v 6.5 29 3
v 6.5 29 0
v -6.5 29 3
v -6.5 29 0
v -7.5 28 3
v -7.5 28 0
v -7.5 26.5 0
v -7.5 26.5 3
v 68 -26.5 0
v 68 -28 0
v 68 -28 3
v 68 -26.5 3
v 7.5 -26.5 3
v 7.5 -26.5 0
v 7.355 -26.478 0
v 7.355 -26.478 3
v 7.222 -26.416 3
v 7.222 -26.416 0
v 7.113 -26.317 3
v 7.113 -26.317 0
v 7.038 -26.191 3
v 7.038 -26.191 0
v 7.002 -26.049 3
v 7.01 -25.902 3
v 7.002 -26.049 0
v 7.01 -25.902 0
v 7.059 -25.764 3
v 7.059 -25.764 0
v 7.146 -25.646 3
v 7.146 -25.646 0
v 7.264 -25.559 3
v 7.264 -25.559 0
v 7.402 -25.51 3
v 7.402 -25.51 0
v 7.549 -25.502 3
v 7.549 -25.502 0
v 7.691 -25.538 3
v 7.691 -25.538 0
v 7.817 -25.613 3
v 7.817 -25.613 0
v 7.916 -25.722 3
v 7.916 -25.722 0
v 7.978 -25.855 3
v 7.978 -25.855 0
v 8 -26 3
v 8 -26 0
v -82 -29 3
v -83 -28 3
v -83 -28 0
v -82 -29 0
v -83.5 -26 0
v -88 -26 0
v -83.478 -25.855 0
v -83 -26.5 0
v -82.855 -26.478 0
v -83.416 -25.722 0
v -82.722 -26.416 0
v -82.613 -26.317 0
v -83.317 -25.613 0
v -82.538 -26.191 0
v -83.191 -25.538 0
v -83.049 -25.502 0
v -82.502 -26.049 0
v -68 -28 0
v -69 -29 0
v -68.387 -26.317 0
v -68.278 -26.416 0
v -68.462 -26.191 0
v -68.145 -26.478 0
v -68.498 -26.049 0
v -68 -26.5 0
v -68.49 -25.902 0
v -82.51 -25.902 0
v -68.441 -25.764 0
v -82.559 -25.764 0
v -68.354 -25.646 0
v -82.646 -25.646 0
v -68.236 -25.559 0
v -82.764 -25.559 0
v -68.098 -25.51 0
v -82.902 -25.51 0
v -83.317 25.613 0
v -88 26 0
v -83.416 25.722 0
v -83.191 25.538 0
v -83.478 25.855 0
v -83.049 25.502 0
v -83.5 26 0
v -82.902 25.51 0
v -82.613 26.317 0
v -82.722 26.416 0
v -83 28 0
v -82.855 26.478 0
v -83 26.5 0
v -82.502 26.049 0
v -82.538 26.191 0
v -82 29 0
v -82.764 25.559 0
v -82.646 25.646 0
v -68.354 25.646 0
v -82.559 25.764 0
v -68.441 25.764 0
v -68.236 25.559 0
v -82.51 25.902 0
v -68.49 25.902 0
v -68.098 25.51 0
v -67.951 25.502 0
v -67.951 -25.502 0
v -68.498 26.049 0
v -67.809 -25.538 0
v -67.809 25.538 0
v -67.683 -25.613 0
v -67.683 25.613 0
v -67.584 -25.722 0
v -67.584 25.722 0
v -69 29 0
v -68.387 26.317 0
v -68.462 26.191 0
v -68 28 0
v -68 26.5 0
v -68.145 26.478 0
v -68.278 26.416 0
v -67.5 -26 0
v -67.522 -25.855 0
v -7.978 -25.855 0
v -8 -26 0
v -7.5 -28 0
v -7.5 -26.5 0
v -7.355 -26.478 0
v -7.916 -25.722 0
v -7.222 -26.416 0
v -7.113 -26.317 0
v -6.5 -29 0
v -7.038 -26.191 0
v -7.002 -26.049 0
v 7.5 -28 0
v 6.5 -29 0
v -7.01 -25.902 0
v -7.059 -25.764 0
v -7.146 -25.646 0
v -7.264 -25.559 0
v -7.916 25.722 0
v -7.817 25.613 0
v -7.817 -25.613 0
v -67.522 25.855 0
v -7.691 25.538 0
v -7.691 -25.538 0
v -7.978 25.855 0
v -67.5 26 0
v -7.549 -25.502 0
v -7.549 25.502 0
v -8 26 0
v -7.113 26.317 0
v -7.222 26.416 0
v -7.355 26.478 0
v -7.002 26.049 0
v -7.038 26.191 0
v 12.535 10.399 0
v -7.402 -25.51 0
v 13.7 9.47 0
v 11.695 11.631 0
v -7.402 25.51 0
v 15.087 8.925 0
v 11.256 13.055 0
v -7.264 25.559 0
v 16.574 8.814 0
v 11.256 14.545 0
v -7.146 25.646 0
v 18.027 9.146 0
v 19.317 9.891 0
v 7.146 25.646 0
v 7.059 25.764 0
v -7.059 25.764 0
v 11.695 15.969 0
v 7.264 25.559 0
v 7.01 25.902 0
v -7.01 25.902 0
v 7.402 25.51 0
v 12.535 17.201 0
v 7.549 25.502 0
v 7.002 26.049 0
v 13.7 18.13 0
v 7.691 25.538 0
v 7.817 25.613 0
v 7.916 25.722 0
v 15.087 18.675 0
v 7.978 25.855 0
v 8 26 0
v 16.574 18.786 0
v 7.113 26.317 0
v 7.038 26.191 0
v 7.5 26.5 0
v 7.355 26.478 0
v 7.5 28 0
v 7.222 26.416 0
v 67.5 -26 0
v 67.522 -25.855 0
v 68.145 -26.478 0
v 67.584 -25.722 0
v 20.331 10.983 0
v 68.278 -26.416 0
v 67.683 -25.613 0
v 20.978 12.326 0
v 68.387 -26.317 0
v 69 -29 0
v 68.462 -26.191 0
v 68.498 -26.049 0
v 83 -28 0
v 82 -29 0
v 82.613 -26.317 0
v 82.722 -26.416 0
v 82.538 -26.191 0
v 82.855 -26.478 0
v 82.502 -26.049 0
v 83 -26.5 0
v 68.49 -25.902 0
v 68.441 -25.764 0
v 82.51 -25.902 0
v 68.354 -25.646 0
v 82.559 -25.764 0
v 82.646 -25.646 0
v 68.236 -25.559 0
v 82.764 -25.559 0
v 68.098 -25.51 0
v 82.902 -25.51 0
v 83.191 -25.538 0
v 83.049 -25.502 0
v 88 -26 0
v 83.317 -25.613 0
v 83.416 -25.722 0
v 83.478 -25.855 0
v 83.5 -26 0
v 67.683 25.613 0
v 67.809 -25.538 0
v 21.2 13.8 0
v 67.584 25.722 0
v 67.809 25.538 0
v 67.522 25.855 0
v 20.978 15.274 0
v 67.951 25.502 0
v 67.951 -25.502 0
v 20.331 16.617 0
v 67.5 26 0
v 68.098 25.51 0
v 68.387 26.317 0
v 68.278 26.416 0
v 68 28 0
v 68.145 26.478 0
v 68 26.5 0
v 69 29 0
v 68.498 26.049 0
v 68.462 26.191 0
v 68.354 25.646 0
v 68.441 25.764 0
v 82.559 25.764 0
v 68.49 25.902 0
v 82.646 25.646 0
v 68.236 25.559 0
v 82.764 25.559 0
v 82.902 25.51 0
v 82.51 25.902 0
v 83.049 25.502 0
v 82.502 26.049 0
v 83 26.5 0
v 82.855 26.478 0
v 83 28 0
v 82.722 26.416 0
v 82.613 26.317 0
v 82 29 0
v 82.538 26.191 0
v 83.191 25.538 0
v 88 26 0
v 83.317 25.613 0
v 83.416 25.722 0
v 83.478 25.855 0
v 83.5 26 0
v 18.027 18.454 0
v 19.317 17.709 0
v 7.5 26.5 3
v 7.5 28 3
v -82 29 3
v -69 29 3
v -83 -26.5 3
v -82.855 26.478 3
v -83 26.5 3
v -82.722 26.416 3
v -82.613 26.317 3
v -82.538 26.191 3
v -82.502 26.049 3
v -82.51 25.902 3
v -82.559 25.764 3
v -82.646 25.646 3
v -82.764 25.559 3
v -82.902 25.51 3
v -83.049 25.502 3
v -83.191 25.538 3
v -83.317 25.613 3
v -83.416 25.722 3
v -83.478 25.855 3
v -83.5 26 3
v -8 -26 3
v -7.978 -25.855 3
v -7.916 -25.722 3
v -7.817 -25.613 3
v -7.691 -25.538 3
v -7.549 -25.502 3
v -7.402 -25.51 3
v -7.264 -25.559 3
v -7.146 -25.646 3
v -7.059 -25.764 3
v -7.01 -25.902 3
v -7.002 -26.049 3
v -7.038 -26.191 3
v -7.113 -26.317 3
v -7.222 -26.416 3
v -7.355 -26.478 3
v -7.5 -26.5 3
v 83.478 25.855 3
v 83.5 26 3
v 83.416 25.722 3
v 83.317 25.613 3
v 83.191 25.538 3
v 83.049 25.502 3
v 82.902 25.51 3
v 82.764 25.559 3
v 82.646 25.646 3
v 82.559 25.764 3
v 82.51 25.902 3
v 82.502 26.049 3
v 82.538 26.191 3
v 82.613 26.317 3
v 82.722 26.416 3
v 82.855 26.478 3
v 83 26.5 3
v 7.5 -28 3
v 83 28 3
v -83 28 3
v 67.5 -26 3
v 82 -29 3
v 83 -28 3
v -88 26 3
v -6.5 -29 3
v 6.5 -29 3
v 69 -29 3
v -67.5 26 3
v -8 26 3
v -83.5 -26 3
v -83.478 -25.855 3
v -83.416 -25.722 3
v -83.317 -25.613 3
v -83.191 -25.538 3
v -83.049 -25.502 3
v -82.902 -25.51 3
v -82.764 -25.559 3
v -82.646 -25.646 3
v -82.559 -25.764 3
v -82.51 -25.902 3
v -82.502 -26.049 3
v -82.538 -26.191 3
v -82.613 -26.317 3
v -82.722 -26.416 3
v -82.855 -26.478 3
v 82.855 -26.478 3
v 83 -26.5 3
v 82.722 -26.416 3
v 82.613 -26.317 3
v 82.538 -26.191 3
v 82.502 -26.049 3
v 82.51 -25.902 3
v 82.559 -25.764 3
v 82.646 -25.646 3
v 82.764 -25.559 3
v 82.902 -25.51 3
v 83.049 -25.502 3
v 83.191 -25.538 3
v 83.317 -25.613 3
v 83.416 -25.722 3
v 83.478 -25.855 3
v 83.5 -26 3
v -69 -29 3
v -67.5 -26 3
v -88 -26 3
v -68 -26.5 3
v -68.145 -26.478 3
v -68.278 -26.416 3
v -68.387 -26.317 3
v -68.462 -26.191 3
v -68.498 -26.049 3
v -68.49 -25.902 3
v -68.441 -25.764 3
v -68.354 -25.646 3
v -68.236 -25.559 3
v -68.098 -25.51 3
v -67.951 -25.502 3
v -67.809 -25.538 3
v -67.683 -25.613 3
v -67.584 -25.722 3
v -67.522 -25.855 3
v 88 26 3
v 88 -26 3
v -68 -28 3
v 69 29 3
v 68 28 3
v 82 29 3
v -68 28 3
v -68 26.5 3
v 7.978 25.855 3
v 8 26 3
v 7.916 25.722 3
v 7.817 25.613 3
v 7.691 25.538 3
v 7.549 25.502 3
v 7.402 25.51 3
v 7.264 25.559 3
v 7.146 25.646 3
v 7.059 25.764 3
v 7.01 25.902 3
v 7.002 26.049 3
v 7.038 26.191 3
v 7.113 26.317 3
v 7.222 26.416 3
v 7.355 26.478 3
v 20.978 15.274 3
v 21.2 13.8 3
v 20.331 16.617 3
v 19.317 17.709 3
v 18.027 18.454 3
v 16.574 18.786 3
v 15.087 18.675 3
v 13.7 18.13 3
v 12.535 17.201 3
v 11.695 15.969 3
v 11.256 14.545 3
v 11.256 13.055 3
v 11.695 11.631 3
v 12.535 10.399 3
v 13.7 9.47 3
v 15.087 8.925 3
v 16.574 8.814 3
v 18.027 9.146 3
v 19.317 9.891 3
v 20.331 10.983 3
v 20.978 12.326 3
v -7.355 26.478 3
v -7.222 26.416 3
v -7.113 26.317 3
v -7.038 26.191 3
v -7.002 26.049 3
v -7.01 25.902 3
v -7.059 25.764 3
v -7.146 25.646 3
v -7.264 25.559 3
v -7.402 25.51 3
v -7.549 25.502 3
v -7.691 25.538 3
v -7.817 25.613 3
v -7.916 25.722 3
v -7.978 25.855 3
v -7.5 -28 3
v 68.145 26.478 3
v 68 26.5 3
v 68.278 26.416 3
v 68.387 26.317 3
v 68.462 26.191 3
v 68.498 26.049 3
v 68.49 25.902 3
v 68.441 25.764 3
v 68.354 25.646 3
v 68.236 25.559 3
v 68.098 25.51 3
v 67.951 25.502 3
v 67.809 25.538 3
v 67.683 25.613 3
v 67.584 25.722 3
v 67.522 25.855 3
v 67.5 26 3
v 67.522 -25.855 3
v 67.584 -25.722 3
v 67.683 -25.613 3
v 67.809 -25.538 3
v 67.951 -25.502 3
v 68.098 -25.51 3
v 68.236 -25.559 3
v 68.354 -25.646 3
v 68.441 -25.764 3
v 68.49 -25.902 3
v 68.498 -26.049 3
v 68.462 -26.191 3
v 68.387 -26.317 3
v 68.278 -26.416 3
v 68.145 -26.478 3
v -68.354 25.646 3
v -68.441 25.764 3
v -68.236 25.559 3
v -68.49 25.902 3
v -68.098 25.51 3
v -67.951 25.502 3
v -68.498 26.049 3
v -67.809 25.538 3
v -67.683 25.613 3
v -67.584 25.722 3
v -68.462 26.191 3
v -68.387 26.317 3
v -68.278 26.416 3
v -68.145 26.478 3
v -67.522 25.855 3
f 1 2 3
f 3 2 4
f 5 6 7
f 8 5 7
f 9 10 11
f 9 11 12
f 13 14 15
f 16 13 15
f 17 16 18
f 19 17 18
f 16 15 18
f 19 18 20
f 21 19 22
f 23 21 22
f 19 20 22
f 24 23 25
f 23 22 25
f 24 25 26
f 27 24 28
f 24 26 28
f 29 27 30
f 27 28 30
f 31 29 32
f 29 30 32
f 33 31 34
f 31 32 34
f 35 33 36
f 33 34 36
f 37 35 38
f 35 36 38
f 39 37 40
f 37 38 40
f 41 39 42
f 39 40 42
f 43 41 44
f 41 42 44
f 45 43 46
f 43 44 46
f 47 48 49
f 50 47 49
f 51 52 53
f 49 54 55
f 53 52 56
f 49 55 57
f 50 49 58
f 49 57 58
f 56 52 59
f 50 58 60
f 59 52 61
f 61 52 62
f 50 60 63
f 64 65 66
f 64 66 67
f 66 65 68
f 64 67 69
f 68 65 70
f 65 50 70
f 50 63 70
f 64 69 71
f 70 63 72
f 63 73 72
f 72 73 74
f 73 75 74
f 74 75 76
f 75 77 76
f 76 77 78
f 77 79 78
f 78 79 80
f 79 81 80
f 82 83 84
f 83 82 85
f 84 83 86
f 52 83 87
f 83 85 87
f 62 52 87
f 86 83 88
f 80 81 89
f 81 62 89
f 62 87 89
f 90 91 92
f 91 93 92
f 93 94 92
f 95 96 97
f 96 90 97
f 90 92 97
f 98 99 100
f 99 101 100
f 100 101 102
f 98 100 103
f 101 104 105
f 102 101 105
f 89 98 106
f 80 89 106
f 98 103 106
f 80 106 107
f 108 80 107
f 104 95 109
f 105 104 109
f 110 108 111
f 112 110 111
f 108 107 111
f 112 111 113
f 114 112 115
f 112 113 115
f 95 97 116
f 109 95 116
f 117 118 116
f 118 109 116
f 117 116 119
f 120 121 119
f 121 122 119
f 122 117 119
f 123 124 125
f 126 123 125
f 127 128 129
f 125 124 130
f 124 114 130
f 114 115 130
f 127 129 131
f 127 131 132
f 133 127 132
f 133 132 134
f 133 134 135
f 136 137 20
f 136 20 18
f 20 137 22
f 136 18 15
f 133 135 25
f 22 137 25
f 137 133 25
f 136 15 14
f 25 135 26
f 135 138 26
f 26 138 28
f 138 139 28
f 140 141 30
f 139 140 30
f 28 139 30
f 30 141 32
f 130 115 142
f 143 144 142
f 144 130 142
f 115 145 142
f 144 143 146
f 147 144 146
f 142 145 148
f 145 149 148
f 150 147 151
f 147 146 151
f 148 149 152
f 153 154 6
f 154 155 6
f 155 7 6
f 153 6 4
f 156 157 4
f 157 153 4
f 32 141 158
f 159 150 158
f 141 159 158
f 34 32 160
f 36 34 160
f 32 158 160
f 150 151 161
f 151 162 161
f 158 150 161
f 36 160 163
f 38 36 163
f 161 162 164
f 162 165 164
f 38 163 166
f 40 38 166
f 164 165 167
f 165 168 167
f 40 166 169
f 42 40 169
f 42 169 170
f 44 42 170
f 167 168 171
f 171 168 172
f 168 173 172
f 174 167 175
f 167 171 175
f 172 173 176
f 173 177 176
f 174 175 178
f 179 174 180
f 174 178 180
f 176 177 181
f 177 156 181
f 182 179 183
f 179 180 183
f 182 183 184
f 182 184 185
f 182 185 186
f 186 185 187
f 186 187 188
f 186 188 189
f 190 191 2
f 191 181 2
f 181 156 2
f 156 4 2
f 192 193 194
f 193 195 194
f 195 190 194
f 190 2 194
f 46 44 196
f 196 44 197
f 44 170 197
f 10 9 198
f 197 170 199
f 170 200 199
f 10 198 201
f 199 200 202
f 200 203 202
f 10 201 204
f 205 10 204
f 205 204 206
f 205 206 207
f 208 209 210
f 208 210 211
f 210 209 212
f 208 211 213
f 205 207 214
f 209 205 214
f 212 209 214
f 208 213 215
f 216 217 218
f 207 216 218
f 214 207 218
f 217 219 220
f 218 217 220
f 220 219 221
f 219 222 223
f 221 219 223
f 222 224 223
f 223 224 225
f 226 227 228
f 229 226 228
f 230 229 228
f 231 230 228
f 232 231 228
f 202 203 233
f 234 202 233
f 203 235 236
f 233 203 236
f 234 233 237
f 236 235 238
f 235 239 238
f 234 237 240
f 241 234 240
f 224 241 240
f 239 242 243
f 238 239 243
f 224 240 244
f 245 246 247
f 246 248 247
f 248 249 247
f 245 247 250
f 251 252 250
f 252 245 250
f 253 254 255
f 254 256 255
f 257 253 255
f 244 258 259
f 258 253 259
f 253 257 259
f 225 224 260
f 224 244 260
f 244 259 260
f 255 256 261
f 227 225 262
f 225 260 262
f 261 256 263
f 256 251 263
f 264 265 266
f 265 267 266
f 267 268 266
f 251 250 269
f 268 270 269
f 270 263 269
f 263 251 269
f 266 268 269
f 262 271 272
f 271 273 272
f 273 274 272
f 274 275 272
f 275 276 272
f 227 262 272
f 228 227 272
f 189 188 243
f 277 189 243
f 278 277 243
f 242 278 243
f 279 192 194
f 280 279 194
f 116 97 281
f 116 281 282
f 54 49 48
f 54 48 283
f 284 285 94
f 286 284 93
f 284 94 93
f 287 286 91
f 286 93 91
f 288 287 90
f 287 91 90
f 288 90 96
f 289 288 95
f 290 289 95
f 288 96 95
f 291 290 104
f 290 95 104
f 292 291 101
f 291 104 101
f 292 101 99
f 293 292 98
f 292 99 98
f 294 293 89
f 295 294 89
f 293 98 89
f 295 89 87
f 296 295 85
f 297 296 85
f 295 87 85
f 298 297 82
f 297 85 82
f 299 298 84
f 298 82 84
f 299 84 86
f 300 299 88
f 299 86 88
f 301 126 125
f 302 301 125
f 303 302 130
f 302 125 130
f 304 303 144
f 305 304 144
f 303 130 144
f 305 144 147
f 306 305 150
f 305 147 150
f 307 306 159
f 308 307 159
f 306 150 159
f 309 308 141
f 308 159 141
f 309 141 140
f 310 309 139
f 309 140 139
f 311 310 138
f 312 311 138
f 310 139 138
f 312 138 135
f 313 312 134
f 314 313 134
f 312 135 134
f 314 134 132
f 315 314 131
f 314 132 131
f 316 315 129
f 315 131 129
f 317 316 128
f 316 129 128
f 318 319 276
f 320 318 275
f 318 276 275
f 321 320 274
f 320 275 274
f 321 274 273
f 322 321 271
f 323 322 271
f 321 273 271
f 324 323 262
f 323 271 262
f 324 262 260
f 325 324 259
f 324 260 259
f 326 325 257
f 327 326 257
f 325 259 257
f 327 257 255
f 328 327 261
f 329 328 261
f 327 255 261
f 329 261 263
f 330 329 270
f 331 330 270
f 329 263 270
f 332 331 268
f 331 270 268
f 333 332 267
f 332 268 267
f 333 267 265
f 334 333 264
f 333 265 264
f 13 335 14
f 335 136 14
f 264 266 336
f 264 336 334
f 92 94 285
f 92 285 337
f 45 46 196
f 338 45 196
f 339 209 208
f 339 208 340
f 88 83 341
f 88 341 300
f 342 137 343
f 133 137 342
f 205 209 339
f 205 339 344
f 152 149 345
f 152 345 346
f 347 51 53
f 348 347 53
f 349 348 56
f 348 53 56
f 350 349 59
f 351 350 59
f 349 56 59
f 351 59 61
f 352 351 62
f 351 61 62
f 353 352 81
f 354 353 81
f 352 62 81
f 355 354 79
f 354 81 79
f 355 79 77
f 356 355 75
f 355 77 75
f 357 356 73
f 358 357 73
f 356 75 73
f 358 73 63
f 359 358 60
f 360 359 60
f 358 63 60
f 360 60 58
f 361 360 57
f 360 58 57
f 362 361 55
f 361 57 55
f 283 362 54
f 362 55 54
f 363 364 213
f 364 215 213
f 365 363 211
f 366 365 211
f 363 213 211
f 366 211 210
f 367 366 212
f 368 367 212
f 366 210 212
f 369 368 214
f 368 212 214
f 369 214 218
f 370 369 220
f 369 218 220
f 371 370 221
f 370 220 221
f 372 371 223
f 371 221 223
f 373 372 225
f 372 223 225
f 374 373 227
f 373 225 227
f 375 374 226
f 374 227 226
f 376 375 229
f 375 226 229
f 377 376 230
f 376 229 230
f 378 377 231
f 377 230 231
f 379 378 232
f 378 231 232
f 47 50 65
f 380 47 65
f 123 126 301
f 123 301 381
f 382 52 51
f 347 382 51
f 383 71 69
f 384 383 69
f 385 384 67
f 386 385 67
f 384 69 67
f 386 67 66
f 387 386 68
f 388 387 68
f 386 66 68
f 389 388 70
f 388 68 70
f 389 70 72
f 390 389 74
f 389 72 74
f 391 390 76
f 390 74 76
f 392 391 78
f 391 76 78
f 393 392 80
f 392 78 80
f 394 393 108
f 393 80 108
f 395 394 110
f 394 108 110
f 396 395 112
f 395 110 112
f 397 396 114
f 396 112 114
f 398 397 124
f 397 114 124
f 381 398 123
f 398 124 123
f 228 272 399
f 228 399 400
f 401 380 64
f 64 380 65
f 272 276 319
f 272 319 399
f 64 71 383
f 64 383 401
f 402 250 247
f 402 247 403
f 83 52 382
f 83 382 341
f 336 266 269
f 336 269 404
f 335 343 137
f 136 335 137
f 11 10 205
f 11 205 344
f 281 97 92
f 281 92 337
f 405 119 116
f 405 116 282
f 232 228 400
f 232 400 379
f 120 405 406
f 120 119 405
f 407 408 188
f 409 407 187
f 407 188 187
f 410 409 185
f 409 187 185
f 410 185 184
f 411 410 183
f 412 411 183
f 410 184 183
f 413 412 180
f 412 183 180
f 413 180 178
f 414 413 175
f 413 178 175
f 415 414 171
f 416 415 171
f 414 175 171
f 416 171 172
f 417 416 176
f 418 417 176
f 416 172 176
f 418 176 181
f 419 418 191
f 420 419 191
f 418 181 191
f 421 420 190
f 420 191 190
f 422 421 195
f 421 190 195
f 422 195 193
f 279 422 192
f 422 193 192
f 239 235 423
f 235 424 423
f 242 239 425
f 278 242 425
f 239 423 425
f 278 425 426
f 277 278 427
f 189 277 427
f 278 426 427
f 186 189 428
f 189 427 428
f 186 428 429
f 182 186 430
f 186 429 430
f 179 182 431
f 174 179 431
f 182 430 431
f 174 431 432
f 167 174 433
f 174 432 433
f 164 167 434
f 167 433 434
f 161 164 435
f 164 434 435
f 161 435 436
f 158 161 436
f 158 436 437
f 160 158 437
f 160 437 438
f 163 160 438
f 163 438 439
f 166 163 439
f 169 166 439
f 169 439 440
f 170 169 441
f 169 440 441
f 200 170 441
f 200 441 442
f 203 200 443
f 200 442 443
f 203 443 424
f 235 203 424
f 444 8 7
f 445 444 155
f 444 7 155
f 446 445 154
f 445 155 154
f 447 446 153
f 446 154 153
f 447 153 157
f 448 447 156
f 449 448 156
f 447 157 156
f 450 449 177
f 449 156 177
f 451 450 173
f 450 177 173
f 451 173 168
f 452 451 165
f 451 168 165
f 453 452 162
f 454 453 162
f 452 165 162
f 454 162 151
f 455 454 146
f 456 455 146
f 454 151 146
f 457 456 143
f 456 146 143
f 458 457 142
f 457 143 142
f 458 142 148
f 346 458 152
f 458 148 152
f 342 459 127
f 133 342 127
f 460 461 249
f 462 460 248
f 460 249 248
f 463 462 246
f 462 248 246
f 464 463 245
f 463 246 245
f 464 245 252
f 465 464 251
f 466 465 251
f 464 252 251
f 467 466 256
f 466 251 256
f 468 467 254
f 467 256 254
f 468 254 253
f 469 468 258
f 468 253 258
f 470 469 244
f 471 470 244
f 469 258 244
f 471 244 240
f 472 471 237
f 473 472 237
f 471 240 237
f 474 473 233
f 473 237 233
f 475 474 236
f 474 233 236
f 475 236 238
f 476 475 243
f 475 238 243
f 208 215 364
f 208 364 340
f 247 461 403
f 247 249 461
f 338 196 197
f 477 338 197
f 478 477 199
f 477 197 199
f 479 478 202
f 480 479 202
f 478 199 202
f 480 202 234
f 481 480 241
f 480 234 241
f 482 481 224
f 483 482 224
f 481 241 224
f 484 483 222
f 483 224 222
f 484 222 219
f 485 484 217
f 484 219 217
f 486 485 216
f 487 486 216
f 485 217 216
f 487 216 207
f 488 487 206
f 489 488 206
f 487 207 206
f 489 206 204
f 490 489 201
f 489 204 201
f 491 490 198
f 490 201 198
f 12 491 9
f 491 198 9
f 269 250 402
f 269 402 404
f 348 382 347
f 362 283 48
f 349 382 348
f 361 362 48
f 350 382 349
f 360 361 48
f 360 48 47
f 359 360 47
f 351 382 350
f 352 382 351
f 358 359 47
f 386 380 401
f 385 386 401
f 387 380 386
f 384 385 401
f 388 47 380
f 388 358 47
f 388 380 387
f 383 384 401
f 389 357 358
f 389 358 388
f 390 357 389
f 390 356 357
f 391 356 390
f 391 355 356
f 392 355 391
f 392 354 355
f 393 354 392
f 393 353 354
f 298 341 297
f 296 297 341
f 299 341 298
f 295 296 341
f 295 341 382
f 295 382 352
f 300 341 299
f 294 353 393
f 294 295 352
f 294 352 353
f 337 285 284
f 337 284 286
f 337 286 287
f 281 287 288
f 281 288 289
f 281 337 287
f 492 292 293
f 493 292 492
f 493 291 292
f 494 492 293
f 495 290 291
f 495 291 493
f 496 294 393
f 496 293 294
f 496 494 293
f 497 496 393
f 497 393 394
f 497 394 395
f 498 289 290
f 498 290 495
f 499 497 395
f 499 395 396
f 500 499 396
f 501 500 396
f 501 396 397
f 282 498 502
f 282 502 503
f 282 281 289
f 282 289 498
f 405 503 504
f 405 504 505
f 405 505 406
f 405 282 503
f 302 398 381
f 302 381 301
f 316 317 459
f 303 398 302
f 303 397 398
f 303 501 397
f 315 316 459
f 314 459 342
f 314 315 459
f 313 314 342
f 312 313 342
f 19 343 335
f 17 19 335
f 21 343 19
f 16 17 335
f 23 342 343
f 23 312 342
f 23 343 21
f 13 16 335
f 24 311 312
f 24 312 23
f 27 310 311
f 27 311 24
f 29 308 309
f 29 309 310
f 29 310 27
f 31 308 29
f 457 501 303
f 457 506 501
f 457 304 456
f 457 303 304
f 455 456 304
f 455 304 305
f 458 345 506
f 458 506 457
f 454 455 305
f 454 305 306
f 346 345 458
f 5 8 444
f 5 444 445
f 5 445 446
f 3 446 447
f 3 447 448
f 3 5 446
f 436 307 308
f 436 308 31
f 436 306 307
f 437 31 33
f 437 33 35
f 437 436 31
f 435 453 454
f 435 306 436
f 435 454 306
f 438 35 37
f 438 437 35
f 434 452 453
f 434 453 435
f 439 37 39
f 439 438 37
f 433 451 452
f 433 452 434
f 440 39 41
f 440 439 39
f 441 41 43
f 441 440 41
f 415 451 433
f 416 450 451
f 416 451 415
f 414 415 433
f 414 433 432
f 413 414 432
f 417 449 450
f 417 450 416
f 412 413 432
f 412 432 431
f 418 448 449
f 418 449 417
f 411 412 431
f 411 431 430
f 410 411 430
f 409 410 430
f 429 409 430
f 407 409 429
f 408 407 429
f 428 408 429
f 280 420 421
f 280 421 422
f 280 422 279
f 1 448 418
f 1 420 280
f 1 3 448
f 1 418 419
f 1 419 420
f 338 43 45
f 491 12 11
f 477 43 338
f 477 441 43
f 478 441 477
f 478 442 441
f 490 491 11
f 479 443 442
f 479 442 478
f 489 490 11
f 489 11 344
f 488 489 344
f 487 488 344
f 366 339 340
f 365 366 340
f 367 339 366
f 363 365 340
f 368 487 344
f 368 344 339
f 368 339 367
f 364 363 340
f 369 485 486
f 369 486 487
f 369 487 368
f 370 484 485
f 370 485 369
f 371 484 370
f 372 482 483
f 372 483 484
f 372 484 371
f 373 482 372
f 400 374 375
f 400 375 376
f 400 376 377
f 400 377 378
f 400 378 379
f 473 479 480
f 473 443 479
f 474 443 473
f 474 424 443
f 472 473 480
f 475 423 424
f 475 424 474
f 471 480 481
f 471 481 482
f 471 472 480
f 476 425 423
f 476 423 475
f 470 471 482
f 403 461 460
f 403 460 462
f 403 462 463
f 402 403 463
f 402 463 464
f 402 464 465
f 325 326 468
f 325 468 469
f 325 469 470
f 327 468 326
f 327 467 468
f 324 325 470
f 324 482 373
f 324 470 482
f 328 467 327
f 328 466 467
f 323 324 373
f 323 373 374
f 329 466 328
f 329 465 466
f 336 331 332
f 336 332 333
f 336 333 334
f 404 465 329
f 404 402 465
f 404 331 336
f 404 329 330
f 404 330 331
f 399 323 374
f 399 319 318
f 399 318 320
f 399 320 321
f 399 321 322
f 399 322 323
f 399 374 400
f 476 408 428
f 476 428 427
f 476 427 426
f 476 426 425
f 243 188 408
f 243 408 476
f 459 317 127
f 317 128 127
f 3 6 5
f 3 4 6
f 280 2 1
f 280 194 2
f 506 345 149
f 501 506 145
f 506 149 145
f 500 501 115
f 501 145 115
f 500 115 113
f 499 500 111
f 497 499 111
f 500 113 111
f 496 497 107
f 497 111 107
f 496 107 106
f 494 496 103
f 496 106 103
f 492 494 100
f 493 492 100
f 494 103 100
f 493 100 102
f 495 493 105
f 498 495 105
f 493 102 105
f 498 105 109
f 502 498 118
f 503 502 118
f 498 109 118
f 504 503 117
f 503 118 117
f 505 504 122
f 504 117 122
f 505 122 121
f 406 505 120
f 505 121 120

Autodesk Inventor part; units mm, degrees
ref_plane "Plan YZ" through (0, 0, 0) normal (1, 0, 0) x (0, 1, 0)
ref_plane "Plan XZ" through (0, 0, 0) normal (0, 1, 0) x (-1, 0, 0)
ref_plane "Plan XY" through (0, 0, 0) normal (0, 0, 1) x (1, 0, 0)
sketch "Esquisse12" plane through (0, 0, 0) normal (0, 0, 1) x (1, 0, 0)
  line L0 (-88, -26) -> (-88, 26)
  line L1 (-88, 26) -> (-83, 26)
  line L2 (-83, 26) -> (-83, 29)
  line L3 (-83, 29) -> (-68, 29)
  line L4 (-68, 29) -> (-68, 26)
  line L5 (7.5, 26) -> (7.5, 29)
  line L6 (7.5, 29) -> (-7.5, 29)
  line L7 (-7.5, 29) -> (-7.5, 26)
  line L8 (68, 26) -> (68, 29)
  line L9 (68, 29) -> (83, 29)
  line L10 (83, 29) -> (83, 26)
  line L11 (83, 26) -> (88, 26)
  line L12 (88, 26) -> (88, -26)
  line L13 (88, -26) -> (83, -26)
  line L14 (83, -26) -> (83, -29)
  line L15 (83, -29) -> (68, -29)
  line L16 (68, -29) -> (68, -26)
  line L17 (-7.5, -26) -> (-7.5, -29)
  line L18 (7.5, -29) -> (7.5, -26)
  line L19 (-68, -26) -> (-68, -29)
  line L20 (-83, -29) -> (-83, -26)
  line L21 (-88, -26) -> (-83, -26)
  line L22 (-83, -29) -> (-68, -29)
  line L23 (7.5, -29) -> (-7.5, -29)
  line L24 (-68, 26) -> (-7.5, 26)
  line L25 (7.5, 26) -> (68, 26)
  line L26 (7.5, -26) -> (68, -26)
  line L27 (-7.5, -26) -> (-68, -26)
  line L28 (-123.2, 0) -> (123.2, 0) construction
  line L29 (0, -40.6) -> (0, 40.6) construction
  point P0 (0, 0)
  dimension "d86" = 52
  dimension "d87" = 3
  dimension "d88" = 5
  dimension "d90" = 15
  dimension "d112" = 176
extrude "Extrusion5" add sketch "Esquisse12" along normal blind 3
sketch "Esquisse13" plane through (0, 0, 3) normal (0, 0, 1) x (1, 0, 0)
  point P0 (0, 0)
  point P1 (-83, 26)
  point P2 (-68, 26)
  point P3 (-83, -26)
  point P4 (-68, -26)
  point P5 (-7.5, -26)
  point P6 (7.5, -26)
  point P7 (68, -26)
  point P8 (83, -26)
  point P9 (83, 26)
  point P10 (68, 26)
  point P11 (-7.5, 26)
  point P12 (7.5, 26)
hole "Perçage6" at (-83, 26, 3) at (-68, 26, 3) at (-83, -26, 3) at (-68, -26, 3) at (-7.5, -26, 3) at (7.5, -26, 3) at (68, -26, 3) at (83, -26, 3) at (83, 26, 3) at (68, 26, 3) at (-7.5, 26, 3) at (7.5, 26, 3) direction (0, 0, -1) diameter 1 end through all
chamfer "Chanfrein3" distance 1 angle 45 12 edges at (-83, 29, 1.5) (-68, 29, 1.5) (-7.5, 29, 1.5) (7.5, 29, 1.5) (68, 29, 1.5) (83, 29, 1.5) (-83, -29, 1.5) (-68, -29, 1.5) (-7.5, -29, 1.5) (7.5, -29, 1.5) (68, -29, 1.5) (83, -29, 1.5)
sketch "Esquisse14" plane through (0, 0, 3) normal (0, 0, 1) x (1, 0, 0)
  circle A0 centre (16.2, 13.8) radius 5
  line L0 (-88, -26) -> (-88, 26) projected
  line L1 (67.5, -26) -> (8, -26) projected
  line L2 (88, 26) -> (88, -26) projected
  point P0 (0, 0)
  dimension "d108" = 39.8
  dimension "d109" = 10
  dimension "d113" = 71.8
extrude "Extrusion6" cut sketch "Esquisse14" against normal through all
properties part number "P1704_103" material "Plastique PMMA"
